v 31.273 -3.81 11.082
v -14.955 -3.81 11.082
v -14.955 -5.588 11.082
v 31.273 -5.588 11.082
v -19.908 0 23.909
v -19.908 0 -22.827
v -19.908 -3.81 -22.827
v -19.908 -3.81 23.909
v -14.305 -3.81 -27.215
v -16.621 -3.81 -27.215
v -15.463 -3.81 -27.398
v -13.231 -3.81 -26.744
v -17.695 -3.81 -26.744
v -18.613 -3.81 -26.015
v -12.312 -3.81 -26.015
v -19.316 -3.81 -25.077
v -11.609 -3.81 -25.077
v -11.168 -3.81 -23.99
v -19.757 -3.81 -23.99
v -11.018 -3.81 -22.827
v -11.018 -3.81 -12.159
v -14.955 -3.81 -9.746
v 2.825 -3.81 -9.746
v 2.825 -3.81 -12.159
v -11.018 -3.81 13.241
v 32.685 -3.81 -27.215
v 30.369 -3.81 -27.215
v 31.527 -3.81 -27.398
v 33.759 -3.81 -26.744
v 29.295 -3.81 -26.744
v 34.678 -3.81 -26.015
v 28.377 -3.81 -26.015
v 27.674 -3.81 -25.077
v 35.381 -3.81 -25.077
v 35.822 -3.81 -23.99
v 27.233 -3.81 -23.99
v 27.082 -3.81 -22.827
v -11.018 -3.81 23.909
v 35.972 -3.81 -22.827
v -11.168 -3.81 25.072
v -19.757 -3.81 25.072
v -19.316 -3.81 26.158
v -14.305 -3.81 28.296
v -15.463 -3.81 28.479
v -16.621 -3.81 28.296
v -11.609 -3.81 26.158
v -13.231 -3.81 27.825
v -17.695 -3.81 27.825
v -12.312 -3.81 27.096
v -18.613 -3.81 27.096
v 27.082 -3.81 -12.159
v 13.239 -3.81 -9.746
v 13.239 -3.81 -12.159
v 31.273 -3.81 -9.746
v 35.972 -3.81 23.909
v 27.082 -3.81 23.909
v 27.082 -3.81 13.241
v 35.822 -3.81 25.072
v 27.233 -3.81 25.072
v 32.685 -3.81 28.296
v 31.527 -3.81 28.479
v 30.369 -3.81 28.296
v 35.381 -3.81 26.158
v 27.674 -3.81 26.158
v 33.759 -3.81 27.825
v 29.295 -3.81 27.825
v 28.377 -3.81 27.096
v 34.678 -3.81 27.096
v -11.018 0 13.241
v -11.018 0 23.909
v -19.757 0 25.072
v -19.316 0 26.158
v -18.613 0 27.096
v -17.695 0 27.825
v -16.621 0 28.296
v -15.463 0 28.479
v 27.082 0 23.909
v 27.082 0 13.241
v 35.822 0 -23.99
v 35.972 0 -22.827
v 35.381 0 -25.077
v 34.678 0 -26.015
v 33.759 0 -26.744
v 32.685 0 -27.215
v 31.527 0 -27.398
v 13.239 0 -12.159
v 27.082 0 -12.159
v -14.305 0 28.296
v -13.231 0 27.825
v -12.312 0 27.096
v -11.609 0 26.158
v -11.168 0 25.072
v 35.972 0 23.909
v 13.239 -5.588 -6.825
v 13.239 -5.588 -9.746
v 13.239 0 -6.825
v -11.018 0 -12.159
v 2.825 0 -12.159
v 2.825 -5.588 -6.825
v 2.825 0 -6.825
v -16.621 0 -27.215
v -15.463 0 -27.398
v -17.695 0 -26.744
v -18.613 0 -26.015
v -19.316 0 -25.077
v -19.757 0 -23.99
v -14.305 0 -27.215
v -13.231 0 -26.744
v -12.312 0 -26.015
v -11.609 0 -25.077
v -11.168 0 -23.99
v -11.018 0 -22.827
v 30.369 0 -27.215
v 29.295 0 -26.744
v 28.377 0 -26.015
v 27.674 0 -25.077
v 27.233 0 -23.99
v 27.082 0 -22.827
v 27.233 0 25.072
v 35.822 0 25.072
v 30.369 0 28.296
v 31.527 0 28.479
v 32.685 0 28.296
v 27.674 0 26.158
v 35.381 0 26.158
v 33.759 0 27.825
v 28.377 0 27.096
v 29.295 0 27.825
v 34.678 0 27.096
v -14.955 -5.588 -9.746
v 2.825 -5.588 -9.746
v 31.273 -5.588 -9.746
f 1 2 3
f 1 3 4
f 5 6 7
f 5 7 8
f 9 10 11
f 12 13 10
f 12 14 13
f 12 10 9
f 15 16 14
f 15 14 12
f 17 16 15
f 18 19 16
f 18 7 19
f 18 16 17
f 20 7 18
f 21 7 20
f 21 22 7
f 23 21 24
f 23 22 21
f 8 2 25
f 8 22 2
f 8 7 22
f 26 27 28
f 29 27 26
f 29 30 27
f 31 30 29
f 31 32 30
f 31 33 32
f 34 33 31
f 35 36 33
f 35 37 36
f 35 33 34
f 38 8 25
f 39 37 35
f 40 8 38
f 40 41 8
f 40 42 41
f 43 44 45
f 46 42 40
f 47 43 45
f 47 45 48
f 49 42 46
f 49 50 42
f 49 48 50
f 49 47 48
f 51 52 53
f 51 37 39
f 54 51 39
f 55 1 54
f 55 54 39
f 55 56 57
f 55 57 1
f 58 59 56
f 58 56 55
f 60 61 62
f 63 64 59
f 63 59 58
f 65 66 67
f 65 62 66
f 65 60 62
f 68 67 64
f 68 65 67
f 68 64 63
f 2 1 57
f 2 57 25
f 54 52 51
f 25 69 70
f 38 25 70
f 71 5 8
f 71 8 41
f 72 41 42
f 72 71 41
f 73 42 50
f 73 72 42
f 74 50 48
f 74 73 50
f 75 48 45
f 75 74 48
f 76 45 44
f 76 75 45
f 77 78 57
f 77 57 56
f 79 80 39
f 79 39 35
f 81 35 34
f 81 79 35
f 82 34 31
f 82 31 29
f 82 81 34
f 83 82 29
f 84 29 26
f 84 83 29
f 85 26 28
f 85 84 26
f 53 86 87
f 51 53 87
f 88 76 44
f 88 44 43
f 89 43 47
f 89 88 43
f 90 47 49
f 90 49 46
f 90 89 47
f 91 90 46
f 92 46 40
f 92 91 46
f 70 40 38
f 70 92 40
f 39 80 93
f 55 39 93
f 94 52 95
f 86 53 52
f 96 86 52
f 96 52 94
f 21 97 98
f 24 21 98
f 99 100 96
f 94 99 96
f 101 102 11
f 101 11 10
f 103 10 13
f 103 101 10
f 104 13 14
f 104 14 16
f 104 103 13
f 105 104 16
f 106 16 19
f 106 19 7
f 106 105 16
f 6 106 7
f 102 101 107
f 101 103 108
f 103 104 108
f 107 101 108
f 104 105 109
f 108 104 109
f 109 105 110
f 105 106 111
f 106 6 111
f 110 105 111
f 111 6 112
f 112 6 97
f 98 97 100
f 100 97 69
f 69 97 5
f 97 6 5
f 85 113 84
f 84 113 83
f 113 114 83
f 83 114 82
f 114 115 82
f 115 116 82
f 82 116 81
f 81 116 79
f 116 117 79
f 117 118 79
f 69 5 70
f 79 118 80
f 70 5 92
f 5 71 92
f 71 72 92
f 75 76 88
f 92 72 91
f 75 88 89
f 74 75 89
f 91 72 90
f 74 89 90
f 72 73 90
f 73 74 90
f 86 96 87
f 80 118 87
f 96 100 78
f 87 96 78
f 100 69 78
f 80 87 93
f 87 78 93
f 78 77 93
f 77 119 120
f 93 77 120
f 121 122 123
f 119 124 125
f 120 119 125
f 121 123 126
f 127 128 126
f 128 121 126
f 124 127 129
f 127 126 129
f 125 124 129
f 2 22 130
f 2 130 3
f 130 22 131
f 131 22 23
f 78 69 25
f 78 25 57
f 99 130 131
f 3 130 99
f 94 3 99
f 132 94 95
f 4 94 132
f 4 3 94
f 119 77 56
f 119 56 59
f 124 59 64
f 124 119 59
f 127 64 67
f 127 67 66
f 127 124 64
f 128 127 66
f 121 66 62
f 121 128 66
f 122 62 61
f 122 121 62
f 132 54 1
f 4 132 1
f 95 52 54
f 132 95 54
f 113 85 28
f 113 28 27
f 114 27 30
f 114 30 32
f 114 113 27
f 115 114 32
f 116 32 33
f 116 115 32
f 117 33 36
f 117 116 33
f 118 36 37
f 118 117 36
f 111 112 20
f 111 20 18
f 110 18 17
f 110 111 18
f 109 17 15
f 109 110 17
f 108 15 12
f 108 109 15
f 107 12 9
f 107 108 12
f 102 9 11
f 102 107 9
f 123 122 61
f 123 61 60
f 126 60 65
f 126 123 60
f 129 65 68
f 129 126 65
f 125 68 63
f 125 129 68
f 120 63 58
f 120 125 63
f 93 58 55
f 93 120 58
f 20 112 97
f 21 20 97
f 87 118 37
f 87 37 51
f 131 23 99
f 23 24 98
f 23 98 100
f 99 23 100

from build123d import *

# Parameters (mm, degrees)
F0_W         = 55.88
F0_H         = 25.4
F1_DEPTH     = 3.81
F2_W         = 46.228
F2_H         = 20.828
F3_DEPTH     = 1.778
F4_W         = 10.414
F4_H         = 9.1227373774
F5_DEPTH     = 25.4
F6_W         = 8.89
F6_H         = 15.24
F7_DEPTH     = 3.81
F8_T1_DEPTH  = 26.67
F10_W        = 8.89
F10_H        = 15.24
F11_DEPTH    = 3.81
F12_T1_DEPTH = 26.67
F13_W        = 8.89
F13_H        = 15.24
F14_DEPTH    = 3.81
F15_T1_DEPTH = 26.67
F16_W        = 8.89
F16_H        = 15.24
F17_DEPTH    = 3.81
F18_T1_DEPTH = 26.67


# Not quite as in the source:
# - a fillet or chamfer that OpenCascade refuses, or shapes differently, is made with other operations: its cross-section is extruded or revolved along the edge and cut away or added


with BuildPart() as f1:
    # F0 (on Front) → F1 (new body)
    with BuildSketch(Plane.XZ):
        with Locations((8.0322436088, 0.5406907029)):
            Rectangle(F0_W, F0_H)
    extrude(amount=F1_DEPTH)

    # F2 (on face) → F3 (join)
    with BuildSketch(Plane.XZ.offset(3.81)):
        with Locations((8.1592436088, 0.6676907029)):
            Rectangle(F2_W, F2_H)
    extrude(amount=F3_DEPTH)

    # F4 (on face) → F5 (cut)
    with BuildSketch(Plane.XZ):
        with Locations((8.0322436088, -11.3866779858)):
            Rectangle(F4_W, F4_H)
    extrude(amount=F5_DEPTH, mode=Mode.SUBTRACT)

    # F6 (on face) → F7 (join)
    with BuildSketch(Plane.XZ):
        with Locations((31.5272436088, 20.8606907029)):
            Rectangle(F6_W, F6_H)
    extrude(amount=F7_DEPTH)

    # F8: fillet of radius 4.572 on 2 edges, made by hand

    # F8_s2 → F8_t1 (cut)
    with BuildSketch(Plane.XZ.offset(-11.43)):
        with BuildLine():
            ThreePointArc((31.4002436088, 28.4806907029), (34.6331358124, 27.1415829065), (35.9722436088, 23.9086907029))
            Line((35.9722436088, 23.9086907029), (35.9722436088, 28.4806907029))
            Line((35.9722436088, 28.4806907029), (31.4002436088, 28.4806907029))
        make_face()
        with BuildLine():
            ThreePointArc((27.0822436088, 23.9086907029), (28.4213514052, 27.1415829065), (31.6542436088, 28.4806907029))
            Line((31.6542436088, 28.4806907029), (27.0822436088, 28.4806907029))
            Line((27.0822436088, 28.4806907029), (27.0822436088, 23.9086907029))
        make_face()
    extrude(amount=F8_T1_DEPTH, mode=Mode.SUBTRACT)

    # F10 (on face) → F11 (join)
    with BuildSketch(Plane.XZ):
        with Locations((-15.4627563912, 20.8606907029)):
            Rectangle(F10_W, F10_H)
    extrude(amount=F11_DEPTH)

    # F12: fillet of radius 4.572 on 2 edges, made by hand

    # F12_s2 → F12_t1 (cut)
    with BuildSketch(Plane.XZ.offset(-11.43)):
        with BuildLine():
            ThreePointArc((-19.9077563912, 23.9086907029), (-18.5686485948, 27.1415829065), (-15.3357563912, 28.4806907029))
            Line((-15.3357563912, 28.4806907029), (-19.9077563912, 28.4806907029))
            Line((-19.9077563912, 28.4806907029), (-19.9077563912, 23.9086907029))
        make_face()
        with BuildLine():
            ThreePointArc((-15.5897563912, 28.4806907029), (-12.3568641876, 27.1415829065), (-11.0177563912, 23.9086907029))
            Line((-11.0177563912, 23.9086907029), (-11.0177563912, 28.4806907029))
            Line((-11.0177563912, 28.4806907029), (-15.5897563912, 28.4806907029))
        make_face()
    extrude(amount=F12_T1_DEPTH, mode=Mode.SUBTRACT)

    # F13 (on face) → F14 (join)
    with BuildSketch(Plane.XZ):
        with Locations((31.5272436088, -19.7793092971)):
            Rectangle(F13_W, F13_H)
    extrude(amount=F14_DEPTH)

    # F15: fillet of radius 4.572 on 2 edges, made by hand

    # F15_s2 → F15_t1 (cut)
    with BuildSketch(Plane.XZ.offset(-11.43)):
        with BuildLine():
            ThreePointArc((35.9722436088, -22.8273092971), (34.6331358124, -26.0602015007), (31.4002436088, -27.3993092971))
            Line((31.4002436088, -27.3993092971), (35.9722436088, -27.3993092971))
            Line((35.9722436088, -27.3993092971), (35.9722436088, -22.8273092971))
        make_face()
        with BuildLine():
            ThreePointArc((31.6542436088, -27.3993092971), (28.4213514052, -26.0602015007), (27.0822436088, -22.8273092971))
            Line((27.0822436088, -22.8273092971), (27.0822436088, -27.3993092971))
            Line((27.0822436088, -27.3993092971), (31.6542436088, -27.3993092971))
        make_face()
    extrude(amount=F15_T1_DEPTH, mode=Mode.SUBTRACT)

    # F16 (on face) → F17 (join)
    with BuildSketch(Plane.XZ):
        with Locations((-15.4627563912, -19.7793092971)):
            Rectangle(F16_W, F16_H)
    extrude(amount=F17_DEPTH)

    # F18: fillet of radius 4.572 on 2 edges, made by hand

    # F18_s2 → F18_t1 (cut)
    with BuildSketch(Plane.XZ.offset(-11.43)):
        with BuildLine():
            ThreePointArc((-15.3357563912, -27.3993092971), (-18.5686485948, -26.0602015007), (-19.9077563912, -22.8273092971))
            Line((-19.9077563912, -22.8273092971), (-19.9077563912, -27.3993092971))
            Line((-19.9077563912, -27.3993092971), (-15.3357563912, -27.3993092971))
        make_face()
        with BuildLine():
            ThreePointArc((-11.0177563912, -22.8273092971), (-12.3568641876, -26.0602015007), (-15.5897563912, -27.3993092971))
            Line((-15.5897563912, -27.3993092971), (-11.0177563912, -27.3993092971))
            Line((-11.0177563912, -27.3993092971), (-11.0177563912, -22.8273092971))
        make_face()
    extrude(amount=F18_T1_DEPTH, mode=Mode.SUBTRACT)


solid = f1.part
